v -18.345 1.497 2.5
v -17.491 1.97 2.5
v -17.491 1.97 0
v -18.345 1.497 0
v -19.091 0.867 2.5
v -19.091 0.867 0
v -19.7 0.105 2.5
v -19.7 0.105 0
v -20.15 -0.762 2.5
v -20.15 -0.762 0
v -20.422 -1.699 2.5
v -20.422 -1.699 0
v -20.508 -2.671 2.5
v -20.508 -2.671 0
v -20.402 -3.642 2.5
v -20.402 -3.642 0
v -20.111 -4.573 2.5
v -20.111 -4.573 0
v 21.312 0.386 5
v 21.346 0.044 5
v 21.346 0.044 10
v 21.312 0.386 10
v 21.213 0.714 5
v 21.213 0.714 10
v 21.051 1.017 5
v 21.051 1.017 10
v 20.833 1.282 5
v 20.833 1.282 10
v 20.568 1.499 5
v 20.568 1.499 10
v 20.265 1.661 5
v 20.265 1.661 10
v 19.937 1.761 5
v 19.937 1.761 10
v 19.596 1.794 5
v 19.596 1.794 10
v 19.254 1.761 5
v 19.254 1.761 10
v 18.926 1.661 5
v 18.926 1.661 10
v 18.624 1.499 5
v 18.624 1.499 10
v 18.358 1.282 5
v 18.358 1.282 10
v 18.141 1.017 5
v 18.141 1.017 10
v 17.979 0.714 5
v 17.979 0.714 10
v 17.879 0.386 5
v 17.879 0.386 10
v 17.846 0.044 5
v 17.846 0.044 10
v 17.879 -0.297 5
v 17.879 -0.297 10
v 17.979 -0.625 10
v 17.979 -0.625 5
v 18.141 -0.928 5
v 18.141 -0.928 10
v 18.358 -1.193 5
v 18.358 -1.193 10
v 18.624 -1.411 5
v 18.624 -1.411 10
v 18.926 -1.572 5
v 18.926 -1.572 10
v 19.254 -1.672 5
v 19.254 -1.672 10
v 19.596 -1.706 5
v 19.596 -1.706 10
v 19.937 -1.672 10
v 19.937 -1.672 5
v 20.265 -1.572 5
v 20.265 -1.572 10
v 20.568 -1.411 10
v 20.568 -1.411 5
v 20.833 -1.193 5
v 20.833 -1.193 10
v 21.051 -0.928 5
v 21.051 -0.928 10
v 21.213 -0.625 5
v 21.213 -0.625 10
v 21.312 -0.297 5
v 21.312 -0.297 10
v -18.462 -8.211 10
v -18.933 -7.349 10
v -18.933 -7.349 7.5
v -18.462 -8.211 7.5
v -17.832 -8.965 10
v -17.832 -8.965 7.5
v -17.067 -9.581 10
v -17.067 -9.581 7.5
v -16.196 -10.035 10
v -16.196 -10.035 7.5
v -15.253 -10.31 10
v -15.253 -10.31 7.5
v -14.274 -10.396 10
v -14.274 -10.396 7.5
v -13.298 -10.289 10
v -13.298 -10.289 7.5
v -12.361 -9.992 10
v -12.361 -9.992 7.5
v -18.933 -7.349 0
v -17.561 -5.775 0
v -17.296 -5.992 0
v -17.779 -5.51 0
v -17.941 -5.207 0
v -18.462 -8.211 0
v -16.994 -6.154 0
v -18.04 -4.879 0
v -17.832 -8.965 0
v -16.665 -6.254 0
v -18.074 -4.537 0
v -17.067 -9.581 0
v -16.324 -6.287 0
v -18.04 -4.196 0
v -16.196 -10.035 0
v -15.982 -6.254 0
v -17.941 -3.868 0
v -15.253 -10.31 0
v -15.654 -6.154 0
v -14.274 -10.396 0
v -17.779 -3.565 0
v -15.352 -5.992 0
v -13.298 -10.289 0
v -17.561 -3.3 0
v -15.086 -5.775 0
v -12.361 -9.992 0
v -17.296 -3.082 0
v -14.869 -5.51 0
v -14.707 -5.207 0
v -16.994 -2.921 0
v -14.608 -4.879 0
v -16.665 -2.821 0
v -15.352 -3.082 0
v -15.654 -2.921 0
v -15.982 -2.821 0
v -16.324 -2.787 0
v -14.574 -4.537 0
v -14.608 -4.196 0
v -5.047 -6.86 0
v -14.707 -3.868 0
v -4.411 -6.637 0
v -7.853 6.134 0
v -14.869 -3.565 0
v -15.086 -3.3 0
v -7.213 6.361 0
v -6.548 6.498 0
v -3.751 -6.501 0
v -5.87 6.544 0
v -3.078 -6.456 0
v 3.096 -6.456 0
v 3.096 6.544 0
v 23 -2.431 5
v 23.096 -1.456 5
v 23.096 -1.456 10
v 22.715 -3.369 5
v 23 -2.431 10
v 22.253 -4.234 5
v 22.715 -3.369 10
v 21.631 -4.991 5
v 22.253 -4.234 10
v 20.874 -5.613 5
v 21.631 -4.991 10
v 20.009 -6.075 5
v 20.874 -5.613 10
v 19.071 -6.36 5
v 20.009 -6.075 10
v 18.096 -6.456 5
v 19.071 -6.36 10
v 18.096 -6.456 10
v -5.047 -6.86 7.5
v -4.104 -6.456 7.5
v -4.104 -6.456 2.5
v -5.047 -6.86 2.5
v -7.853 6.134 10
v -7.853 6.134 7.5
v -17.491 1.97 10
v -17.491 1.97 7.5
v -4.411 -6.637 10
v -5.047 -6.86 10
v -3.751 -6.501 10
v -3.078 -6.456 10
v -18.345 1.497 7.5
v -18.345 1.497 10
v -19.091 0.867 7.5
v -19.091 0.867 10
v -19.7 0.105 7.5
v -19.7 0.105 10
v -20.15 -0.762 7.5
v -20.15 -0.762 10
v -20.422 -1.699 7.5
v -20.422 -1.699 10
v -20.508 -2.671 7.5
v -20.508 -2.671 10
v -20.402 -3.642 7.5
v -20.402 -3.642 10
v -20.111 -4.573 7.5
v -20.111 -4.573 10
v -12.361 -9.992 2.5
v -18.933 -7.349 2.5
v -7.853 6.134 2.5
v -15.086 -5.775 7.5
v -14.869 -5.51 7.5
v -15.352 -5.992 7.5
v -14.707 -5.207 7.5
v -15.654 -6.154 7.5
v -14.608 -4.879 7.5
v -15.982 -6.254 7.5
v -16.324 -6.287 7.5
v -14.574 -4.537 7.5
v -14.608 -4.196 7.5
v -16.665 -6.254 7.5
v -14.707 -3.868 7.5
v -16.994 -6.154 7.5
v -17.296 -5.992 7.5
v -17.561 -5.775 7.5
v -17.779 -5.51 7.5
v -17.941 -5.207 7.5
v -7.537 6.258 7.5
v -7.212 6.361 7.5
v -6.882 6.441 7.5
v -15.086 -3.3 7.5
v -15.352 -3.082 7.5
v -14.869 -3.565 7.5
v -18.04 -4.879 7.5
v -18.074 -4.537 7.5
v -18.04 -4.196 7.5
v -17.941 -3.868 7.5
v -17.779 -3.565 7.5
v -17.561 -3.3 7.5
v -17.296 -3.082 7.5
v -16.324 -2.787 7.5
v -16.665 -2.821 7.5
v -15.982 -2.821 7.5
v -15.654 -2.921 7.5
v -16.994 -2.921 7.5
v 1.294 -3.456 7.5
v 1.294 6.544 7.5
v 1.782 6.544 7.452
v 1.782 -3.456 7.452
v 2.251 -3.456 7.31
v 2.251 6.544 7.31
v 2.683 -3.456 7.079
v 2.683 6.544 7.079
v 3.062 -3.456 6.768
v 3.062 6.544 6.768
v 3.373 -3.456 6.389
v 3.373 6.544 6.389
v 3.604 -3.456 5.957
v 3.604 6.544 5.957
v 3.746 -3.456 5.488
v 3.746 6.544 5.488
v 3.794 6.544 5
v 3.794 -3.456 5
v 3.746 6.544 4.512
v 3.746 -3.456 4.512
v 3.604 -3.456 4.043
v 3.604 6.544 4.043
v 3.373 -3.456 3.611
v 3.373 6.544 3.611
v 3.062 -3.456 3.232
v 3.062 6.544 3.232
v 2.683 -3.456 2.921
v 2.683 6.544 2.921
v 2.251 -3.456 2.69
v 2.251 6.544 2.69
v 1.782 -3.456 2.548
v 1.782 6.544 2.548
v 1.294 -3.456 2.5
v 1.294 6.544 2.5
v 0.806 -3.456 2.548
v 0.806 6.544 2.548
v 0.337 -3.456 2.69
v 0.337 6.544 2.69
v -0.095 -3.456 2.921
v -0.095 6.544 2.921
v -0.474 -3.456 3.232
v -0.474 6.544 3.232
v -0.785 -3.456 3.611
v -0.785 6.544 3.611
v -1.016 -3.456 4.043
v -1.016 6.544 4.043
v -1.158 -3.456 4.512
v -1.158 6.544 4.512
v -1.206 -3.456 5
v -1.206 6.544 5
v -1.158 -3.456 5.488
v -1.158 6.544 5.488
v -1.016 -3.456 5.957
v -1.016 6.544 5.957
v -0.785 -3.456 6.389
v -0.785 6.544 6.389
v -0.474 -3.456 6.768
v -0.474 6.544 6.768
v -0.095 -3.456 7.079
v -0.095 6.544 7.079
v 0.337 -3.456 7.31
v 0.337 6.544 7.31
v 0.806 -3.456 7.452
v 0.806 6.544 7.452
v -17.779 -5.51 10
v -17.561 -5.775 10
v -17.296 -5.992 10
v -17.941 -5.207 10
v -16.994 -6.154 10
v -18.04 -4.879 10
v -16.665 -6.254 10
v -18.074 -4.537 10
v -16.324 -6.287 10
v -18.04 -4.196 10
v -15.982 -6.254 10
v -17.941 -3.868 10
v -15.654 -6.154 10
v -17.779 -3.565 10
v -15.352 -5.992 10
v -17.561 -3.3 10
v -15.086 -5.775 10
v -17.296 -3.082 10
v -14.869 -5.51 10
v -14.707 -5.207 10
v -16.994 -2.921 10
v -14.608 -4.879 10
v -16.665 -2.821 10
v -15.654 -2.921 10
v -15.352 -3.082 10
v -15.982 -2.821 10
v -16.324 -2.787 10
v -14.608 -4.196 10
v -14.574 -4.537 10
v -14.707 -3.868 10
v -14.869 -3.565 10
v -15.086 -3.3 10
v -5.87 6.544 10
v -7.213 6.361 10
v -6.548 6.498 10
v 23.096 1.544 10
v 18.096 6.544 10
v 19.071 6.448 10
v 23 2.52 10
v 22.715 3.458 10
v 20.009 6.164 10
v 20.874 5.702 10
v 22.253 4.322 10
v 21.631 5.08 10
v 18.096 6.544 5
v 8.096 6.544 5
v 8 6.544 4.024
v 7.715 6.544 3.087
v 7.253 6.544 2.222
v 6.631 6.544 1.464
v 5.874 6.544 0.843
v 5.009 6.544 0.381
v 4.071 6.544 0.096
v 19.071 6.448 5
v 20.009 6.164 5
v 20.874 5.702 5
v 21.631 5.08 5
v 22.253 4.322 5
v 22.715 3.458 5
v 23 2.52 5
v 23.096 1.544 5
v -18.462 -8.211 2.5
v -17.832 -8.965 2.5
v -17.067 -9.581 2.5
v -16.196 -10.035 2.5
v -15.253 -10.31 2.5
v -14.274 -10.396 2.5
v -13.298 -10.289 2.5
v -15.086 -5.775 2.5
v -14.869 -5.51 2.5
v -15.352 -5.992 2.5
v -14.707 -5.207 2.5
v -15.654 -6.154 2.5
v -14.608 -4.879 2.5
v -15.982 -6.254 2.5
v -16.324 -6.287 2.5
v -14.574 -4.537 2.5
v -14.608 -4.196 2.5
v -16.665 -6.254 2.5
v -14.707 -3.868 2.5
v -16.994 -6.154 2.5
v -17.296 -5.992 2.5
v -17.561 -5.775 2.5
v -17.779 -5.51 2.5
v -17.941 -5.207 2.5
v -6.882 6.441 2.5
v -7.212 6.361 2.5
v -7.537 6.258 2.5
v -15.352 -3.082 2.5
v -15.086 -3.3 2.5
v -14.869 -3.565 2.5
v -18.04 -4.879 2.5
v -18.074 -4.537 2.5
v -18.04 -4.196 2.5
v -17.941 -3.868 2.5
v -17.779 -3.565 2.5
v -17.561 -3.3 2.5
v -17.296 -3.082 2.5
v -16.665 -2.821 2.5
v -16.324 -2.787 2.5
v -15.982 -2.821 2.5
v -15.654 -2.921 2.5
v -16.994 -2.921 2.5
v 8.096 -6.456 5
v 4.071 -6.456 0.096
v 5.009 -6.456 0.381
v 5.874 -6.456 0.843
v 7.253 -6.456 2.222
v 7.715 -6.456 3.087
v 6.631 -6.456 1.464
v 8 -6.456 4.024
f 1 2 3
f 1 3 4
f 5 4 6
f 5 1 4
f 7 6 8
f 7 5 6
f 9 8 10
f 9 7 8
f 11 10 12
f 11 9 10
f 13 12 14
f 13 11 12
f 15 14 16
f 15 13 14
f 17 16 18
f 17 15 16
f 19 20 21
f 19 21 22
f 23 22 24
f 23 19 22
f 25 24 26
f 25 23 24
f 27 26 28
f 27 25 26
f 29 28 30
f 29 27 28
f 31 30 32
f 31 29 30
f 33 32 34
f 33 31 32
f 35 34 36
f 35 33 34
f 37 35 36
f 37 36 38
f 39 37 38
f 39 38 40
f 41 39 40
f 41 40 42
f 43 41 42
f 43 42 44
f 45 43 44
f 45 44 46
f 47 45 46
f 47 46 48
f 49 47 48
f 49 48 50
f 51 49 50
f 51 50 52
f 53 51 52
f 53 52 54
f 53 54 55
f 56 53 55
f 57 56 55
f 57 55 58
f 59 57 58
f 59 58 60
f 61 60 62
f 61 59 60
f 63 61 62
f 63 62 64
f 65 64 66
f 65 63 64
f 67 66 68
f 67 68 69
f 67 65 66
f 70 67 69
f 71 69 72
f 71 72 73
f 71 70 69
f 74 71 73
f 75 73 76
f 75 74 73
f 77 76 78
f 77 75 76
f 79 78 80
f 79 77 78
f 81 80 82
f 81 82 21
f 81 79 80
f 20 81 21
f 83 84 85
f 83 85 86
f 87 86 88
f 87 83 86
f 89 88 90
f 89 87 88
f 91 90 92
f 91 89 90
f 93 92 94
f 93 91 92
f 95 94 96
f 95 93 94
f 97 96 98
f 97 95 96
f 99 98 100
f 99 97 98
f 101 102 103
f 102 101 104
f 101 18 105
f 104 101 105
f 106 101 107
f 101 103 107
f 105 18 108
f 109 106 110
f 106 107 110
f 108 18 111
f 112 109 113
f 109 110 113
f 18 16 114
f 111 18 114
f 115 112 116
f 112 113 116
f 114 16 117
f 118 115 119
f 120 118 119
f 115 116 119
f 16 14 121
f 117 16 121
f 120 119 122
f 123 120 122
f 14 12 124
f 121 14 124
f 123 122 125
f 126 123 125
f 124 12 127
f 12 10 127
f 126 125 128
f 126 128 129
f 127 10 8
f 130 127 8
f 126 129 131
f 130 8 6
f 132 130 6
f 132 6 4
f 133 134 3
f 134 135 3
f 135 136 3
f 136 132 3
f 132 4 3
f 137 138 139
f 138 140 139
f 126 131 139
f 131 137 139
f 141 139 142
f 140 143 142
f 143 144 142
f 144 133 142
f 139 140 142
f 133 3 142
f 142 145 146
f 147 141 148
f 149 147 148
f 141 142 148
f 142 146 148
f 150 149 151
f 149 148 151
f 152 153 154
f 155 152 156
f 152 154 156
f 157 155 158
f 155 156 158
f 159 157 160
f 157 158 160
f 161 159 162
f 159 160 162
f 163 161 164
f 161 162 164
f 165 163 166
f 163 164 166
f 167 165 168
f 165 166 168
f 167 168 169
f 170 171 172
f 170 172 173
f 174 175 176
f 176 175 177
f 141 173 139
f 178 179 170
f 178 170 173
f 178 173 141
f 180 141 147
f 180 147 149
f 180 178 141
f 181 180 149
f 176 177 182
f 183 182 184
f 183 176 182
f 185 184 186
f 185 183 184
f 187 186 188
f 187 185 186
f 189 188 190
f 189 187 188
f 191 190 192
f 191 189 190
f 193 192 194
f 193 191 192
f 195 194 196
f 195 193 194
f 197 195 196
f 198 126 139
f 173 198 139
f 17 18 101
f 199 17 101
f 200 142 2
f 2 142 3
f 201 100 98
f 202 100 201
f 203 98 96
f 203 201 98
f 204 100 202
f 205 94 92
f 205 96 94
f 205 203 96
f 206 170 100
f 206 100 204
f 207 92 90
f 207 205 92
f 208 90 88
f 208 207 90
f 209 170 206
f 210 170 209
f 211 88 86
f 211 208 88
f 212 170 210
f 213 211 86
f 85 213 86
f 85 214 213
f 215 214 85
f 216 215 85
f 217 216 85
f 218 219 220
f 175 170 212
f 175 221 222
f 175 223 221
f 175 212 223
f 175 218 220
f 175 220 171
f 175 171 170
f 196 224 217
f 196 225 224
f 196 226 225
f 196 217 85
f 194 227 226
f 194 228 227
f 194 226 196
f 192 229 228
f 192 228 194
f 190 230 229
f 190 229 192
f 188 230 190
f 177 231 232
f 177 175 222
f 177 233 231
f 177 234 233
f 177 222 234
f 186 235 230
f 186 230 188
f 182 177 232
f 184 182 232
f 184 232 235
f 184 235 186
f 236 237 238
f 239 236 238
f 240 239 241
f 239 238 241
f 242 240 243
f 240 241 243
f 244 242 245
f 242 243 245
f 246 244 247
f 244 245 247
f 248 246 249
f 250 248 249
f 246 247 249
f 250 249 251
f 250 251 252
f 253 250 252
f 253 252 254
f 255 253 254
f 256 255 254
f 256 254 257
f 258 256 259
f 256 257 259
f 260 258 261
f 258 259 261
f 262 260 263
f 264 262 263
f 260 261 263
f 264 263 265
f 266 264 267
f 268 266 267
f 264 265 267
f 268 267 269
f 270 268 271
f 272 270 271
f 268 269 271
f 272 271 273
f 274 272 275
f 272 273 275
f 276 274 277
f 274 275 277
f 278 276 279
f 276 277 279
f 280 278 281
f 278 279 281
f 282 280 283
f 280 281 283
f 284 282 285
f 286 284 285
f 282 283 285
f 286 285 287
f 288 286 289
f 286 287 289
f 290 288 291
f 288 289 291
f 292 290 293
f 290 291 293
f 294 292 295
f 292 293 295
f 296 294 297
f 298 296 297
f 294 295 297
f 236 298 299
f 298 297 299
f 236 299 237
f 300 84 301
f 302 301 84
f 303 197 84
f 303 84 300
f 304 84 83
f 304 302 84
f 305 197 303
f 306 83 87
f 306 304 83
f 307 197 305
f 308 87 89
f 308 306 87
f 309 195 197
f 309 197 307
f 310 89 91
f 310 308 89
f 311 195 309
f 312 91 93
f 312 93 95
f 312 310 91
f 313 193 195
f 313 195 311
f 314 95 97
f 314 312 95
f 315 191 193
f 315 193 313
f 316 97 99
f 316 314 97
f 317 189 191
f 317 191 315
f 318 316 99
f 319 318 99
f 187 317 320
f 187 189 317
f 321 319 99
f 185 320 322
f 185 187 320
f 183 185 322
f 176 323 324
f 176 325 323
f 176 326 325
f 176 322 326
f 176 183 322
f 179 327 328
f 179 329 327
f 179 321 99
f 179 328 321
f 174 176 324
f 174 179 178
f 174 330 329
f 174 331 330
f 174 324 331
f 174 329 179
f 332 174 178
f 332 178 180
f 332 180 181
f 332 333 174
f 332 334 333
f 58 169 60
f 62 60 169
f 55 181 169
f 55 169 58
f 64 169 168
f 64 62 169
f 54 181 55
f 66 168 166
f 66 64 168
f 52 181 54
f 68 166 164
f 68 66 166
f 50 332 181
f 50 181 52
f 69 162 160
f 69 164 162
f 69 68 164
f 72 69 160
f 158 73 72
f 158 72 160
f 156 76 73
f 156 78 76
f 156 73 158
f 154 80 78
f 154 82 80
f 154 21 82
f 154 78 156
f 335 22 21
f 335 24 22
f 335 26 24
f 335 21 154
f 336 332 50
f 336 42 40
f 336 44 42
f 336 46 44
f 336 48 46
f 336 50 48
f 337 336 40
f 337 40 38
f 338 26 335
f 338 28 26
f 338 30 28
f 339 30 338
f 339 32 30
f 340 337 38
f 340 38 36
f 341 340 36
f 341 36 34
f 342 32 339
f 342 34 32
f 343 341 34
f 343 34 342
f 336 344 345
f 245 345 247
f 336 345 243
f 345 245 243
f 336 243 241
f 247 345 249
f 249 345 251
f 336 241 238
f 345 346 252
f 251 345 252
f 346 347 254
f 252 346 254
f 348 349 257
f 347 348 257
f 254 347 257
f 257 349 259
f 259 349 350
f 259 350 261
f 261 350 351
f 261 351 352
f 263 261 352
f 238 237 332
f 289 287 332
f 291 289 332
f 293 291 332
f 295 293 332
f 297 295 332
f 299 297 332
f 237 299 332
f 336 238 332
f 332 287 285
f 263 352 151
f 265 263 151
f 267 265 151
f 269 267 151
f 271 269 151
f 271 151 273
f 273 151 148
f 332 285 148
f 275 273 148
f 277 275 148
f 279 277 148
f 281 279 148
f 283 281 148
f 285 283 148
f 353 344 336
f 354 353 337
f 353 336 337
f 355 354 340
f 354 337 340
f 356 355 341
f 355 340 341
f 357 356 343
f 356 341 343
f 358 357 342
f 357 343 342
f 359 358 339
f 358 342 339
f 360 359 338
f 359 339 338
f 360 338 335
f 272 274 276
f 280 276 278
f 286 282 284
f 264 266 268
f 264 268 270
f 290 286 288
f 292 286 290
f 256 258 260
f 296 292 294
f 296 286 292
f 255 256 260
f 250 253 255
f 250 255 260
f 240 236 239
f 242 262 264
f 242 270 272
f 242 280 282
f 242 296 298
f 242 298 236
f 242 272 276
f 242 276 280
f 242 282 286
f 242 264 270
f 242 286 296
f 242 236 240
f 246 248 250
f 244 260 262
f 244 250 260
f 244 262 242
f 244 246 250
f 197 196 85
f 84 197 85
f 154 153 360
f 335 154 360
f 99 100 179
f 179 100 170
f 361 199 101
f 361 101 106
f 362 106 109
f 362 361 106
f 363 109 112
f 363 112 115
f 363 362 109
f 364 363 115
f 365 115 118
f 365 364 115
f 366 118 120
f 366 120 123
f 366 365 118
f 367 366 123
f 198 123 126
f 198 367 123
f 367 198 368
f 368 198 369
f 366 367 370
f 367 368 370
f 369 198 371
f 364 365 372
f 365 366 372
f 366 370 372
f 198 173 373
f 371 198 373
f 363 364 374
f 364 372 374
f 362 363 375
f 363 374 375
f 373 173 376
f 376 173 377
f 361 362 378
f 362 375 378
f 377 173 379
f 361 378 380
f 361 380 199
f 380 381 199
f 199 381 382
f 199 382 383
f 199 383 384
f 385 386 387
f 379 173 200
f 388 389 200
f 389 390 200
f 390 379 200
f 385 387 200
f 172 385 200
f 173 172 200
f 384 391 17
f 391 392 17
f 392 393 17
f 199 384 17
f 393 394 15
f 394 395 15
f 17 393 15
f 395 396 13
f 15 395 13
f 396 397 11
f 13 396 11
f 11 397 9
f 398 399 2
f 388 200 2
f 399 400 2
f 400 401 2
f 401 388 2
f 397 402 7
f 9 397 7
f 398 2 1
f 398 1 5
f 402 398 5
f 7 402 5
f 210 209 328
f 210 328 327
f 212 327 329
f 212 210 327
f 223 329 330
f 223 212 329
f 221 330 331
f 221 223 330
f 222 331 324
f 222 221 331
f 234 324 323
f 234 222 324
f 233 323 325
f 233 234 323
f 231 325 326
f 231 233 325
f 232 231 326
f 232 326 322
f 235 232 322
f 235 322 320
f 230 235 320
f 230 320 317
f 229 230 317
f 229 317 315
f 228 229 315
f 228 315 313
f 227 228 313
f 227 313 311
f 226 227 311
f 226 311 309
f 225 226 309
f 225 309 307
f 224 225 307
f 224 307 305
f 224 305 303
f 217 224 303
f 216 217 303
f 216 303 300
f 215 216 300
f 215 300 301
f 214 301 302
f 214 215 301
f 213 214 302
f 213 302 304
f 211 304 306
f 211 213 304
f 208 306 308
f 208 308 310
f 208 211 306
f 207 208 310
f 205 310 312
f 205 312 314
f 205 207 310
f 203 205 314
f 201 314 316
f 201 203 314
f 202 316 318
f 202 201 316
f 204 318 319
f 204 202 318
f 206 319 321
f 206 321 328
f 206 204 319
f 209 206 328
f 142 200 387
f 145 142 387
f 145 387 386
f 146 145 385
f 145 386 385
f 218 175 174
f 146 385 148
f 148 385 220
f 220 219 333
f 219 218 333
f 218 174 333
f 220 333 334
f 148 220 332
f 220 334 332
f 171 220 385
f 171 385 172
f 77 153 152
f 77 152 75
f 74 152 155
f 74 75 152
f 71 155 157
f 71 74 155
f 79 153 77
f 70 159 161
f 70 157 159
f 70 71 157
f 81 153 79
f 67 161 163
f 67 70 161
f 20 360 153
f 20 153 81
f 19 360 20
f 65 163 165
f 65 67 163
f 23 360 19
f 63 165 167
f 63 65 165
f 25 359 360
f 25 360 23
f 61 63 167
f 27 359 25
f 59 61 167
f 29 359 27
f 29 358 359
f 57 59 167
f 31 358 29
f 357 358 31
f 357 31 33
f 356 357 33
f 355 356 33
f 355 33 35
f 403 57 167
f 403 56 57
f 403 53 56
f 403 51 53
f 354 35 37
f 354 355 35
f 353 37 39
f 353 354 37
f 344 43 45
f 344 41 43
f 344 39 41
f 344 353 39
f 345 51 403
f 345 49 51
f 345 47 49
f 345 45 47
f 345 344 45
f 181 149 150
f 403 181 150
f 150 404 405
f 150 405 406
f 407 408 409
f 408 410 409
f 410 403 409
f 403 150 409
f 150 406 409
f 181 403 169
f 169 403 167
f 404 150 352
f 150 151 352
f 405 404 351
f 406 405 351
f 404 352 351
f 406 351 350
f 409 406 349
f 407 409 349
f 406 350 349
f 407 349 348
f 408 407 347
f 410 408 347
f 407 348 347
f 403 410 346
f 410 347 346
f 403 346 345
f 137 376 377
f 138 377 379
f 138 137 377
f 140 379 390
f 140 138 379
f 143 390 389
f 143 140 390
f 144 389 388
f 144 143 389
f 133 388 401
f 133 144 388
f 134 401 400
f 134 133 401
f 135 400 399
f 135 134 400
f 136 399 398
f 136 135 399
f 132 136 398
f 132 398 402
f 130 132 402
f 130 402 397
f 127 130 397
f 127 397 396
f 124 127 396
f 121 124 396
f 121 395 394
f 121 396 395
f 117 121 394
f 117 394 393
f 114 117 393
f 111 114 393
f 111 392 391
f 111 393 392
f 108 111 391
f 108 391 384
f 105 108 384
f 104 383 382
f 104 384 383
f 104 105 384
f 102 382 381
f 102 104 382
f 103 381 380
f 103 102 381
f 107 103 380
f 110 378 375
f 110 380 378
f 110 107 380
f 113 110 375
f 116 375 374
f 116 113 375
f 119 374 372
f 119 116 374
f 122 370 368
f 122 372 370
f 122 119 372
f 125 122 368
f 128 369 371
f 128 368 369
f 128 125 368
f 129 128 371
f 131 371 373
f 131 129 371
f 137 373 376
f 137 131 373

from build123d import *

# Parameters (mm, degrees)
SKETCH_1_R           = 1.75
EXTRUDE_1_DEPTH      = 10
FILLET_8_R           = 5
CUT_EXTRUDE_7_DEPTH  = 2.5
CUT_EXTRUDE_8_DEPTH  = 2.5
CUT_EXTRUDE_9_DEPTH  = 5
FILLET_10_R          = 5
SKETCH_12_R          = 2.5
CUT_EXTRUDE_10_DEPTH = 10


with BuildPart() as part:
    # 스케치1 → 보스-돌출1 (new body)
    with BuildSketch(Plane.XY):
        Polygon((-6.904227126, 6.544293027), (-22.050718655, -0.000460165), (-16.973385404, -11.96794474), (-4.104227126, -6.455706973), (23.095772874, -6.455706973), (23.095772874, 6.544293027), align=None)
        with Locations((-16.323899965, -4.537411593)):
            Circle(SKETCH_1_R, mode=Mode.SUBTRACT)
        with Locations((19.595772874, 0.044293027)):
            Circle(SKETCH_1_R, mode=Mode.SUBTRACT)
    extrude(amount=EXTRUDE_1_DEPTH)

    # 필렛8
    fillet_8_edges = [part.edges().sort_by_distance(p)[0] for p in [
        (23.095772874, -6.455706973, 5),
        (-4.104227126, -6.455706973, 5),
        (-16.973385404, -11.96794474, 5),
        (-22.050718655, -0.000460165, 5),
        (-6.904227126, 6.544293027, 5),
        (23.095772874, 6.544293027, 5),
    ]]
    fillet(fillet_8_edges, radius=FILLET_8_R)

    # 스케치9 → 컷-돌출7 (cut)
    with BuildSketch(Plane.XY.offset(5)):
        Polygon((-22.050718655, -0.000460165), (-6.904227126, 6.544293027), (-4.104227126, -6.455706973), (-16.973385404, -11.96794474), align=None)
    extrude(amount=-CUT_EXTRUDE_7_DEPTH, mode=Mode.SUBTRACT)

    # 스케치10 → 컷-돌출8 (cut)
    with BuildSketch(Plane.XY.offset(5)):
        Polygon((-22.050718655, -0.000460165), (-6.904227126, 6.544293027), (-4.104227126, -6.455706973), (-16.973385404, -11.96794474), align=None)
    extrude(amount=CUT_EXTRUDE_8_DEPTH, mode=Mode.SUBTRACT)

    # 스케치11 → 컷-돌출9 (cut)
    with BuildSketch(Plane.XY.offset(5)):
        Polygon((8.095772874, 6.544293027), (23.109867502, 6.568608602), (23.095772874, -6.455706973), (8.095772874, -6.455706973), align=None)
    extrude(amount=-CUT_EXTRUDE_9_DEPTH, mode=Mode.SUBTRACT)

    # 필렛10
    fillet_10_edges = [part.edges().sort_by_distance(p)[0] for p in [
        (8.095772874, 0.044293027, 0),
    ]]
    fillet(fillet_10_edges, radius=FILLET_10_R - 0.0001)  # a hair under: the kernel refuses the full size

    # 스케치12 → 컷-돌출10 (cut)
    with BuildSketch(Plane(origin=(0, 6.544293027, 0), x_dir=(1, 0, 0), z_dir=(0, 1, 0))):
        with Locations(Location((1.29393204, -5, 0), (0, 0, 270))):
            Circle(SKETCH_12_R)
    extrude(amount=-CUT_EXTRUDE_10_DEPTH, mode=Mode.SUBTRACT)


solid = part.part
